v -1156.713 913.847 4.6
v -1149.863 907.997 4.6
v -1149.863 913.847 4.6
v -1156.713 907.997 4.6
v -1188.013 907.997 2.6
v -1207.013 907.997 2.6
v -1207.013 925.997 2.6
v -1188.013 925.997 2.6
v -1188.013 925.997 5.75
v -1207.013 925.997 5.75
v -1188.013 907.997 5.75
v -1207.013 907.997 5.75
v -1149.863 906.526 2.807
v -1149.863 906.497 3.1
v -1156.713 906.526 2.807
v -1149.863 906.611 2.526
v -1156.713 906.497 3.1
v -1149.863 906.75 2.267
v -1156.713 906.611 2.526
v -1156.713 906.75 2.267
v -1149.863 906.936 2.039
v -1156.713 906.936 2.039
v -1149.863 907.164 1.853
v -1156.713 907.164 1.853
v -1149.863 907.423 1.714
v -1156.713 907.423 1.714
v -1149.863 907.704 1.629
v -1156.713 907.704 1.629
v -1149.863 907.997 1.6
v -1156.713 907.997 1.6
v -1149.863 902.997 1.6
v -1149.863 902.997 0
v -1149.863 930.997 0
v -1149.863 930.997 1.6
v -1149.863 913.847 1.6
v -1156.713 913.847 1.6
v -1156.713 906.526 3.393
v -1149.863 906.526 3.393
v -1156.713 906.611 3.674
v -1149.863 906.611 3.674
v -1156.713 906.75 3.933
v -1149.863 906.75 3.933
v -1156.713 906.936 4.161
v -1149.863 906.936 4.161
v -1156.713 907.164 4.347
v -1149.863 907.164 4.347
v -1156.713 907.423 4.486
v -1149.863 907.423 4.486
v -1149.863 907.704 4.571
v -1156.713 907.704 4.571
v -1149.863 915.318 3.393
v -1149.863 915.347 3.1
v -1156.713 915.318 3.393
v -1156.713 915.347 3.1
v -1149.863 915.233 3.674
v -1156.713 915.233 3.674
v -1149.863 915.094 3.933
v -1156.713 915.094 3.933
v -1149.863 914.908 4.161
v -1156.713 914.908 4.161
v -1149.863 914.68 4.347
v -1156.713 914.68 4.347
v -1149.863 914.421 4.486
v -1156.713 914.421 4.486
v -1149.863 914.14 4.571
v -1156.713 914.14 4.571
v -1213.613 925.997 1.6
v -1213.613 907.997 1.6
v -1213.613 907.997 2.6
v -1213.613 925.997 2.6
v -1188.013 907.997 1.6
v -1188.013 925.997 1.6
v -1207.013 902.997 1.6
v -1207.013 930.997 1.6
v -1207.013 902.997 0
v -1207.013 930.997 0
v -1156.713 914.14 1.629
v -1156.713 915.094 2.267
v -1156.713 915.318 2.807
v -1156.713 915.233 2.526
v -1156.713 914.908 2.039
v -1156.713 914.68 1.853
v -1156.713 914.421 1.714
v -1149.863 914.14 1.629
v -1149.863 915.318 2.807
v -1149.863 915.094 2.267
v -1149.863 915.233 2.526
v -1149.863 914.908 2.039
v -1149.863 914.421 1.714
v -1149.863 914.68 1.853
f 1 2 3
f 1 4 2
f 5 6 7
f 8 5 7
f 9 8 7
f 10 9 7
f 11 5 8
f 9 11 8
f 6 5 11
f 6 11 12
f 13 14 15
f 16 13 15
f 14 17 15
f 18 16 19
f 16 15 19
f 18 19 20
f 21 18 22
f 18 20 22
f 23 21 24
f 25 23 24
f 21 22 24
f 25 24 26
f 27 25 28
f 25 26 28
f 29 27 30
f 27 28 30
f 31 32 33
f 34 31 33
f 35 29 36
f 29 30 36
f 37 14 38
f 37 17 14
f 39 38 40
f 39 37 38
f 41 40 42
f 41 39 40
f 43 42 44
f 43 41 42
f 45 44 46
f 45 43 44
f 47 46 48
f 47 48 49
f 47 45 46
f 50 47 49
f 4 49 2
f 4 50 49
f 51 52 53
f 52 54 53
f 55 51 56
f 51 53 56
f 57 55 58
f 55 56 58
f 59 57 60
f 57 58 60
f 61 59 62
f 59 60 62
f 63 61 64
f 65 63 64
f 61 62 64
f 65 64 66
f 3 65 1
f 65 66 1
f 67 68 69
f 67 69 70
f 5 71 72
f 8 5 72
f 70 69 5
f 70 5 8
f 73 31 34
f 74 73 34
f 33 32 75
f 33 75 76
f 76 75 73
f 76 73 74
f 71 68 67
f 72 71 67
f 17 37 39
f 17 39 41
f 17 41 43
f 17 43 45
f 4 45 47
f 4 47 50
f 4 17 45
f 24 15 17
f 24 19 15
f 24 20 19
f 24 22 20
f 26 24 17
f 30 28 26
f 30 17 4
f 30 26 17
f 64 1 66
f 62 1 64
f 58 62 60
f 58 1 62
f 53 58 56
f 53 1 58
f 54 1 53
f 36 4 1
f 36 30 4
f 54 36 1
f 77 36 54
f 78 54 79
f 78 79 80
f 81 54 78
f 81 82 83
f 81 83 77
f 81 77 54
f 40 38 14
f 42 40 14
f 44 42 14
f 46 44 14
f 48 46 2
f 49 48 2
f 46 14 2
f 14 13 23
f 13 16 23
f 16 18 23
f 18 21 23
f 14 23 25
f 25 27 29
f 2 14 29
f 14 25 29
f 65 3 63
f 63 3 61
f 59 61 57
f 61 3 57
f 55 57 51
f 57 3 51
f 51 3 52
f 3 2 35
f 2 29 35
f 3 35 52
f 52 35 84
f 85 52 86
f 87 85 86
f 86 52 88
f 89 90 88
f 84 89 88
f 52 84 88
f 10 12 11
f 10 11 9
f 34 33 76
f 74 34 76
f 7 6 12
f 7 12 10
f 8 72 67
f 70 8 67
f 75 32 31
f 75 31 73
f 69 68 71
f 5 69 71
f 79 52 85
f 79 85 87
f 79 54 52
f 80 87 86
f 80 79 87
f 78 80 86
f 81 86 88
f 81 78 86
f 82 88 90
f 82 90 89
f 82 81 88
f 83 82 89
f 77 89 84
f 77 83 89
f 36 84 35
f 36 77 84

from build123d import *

# Parameters (mm, degrees)
SKETCH1_W           = 28
SKETCH1_H           = 57.15
BOSS_EXTRUDE1_DEPTH = 1.6
BOSS_EXTRUDE2_START = 1.6
SKETCH1_4_W         = 8.85
SKETCH1_4_H         = 6.85
BOSS_EXTRUDE2_DEPTH = 3
FILLET1_R           = 1.5
BOSS_EXTRUDE3_START = 1.6
SKETCH1_5_W         = 18
SKETCH1_5_H         = 6.6
SKETCH1_5_H_2       = 19
BOSS_EXTRUDE3_DEPTH = 1
BOSS_EXTRUDE4_START = 2.6
SKETCH1_6_W         = 18
SKETCH1_6_H         = 19
BOSS_EXTRUDE4_DEPTH = 3.15


with BuildPart() as part:
    # Sketch1 → Boss-Extrude1 (new body)
    with BuildSketch(Plane(origin=(0, 0, 0), x_dir=(0, 1, 0), z_dir=(0, 0, 1))):
        with Locations((916.997058045, 1178.438029113)):
            Rectangle(SKETCH1_W, SKETCH1_H)
    extrude(amount=BOSS_EXTRUDE1_DEPTH)


with BuildPart() as body_2:
    # Sketch1<4> → Boss-Extrude2 (new body)
    with BuildSketch(Plane(origin=(0, 0, 0), x_dir=(0, 1, 0), z_dir=(0, 0, 1)).offset(BOSS_EXTRUDE2_START)):
        with Locations((910.922058045, 1153.288029113)):
            Rectangle(SKETCH1_4_W, SKETCH1_4_H)
    extrude(amount=BOSS_EXTRUDE2_DEPTH)

    # Fillet1
    fillet1_edges = [body_2.edges().sort_by_distance(p)[0] for p in [
        (-1153.288029113, 906.497058045, 1.6),
        (-1153.288029113, 915.347058045, 1.6),
        (-1153.288029113, 915.347058045, 4.6),
        (-1153.288029113, 906.497058045, 4.6),
    ]]
    fillet(fillet1_edges, radius=FILLET1_R - 0.0001)  # a hair under: the kernel refuses the full size


with BuildPart() as body_3:
    # Sketch1<5> → Boss-Extrude3 (new body)
    with BuildSketch(Plane(origin=(0, 0, 0), x_dir=(0, 1, 0), z_dir=(0, 0, 1)).offset(BOSS_EXTRUDE3_START)):
        with Locations((916.997058045, 1210.313029113)):
            Rectangle(SKETCH1_5_W, SKETCH1_5_H)
        with Locations((916.997058045, 1197.513029113)):
            Rectangle(SKETCH1_5_W, SKETCH1_5_H_2)
    extrude(amount=BOSS_EXTRUDE3_DEPTH)


with BuildPart() as body_4:
    # Sketch1<6> → Boss-Extrude4 (new body)
    with BuildSketch(Plane(origin=(0, 0, 0), x_dir=(0, 1, 0), z_dir=(0, 0, 1)).offset(BOSS_EXTRUDE4_START)):
        with Locations((916.997058045, 1197.513029113)):
            Rectangle(SKETCH1_6_W, SKETCH1_6_H)
    extrude(amount=BOSS_EXTRUDE4_DEPTH)


solid = Compound([part.part, body_2.part, body_3.part, body_4.part])
